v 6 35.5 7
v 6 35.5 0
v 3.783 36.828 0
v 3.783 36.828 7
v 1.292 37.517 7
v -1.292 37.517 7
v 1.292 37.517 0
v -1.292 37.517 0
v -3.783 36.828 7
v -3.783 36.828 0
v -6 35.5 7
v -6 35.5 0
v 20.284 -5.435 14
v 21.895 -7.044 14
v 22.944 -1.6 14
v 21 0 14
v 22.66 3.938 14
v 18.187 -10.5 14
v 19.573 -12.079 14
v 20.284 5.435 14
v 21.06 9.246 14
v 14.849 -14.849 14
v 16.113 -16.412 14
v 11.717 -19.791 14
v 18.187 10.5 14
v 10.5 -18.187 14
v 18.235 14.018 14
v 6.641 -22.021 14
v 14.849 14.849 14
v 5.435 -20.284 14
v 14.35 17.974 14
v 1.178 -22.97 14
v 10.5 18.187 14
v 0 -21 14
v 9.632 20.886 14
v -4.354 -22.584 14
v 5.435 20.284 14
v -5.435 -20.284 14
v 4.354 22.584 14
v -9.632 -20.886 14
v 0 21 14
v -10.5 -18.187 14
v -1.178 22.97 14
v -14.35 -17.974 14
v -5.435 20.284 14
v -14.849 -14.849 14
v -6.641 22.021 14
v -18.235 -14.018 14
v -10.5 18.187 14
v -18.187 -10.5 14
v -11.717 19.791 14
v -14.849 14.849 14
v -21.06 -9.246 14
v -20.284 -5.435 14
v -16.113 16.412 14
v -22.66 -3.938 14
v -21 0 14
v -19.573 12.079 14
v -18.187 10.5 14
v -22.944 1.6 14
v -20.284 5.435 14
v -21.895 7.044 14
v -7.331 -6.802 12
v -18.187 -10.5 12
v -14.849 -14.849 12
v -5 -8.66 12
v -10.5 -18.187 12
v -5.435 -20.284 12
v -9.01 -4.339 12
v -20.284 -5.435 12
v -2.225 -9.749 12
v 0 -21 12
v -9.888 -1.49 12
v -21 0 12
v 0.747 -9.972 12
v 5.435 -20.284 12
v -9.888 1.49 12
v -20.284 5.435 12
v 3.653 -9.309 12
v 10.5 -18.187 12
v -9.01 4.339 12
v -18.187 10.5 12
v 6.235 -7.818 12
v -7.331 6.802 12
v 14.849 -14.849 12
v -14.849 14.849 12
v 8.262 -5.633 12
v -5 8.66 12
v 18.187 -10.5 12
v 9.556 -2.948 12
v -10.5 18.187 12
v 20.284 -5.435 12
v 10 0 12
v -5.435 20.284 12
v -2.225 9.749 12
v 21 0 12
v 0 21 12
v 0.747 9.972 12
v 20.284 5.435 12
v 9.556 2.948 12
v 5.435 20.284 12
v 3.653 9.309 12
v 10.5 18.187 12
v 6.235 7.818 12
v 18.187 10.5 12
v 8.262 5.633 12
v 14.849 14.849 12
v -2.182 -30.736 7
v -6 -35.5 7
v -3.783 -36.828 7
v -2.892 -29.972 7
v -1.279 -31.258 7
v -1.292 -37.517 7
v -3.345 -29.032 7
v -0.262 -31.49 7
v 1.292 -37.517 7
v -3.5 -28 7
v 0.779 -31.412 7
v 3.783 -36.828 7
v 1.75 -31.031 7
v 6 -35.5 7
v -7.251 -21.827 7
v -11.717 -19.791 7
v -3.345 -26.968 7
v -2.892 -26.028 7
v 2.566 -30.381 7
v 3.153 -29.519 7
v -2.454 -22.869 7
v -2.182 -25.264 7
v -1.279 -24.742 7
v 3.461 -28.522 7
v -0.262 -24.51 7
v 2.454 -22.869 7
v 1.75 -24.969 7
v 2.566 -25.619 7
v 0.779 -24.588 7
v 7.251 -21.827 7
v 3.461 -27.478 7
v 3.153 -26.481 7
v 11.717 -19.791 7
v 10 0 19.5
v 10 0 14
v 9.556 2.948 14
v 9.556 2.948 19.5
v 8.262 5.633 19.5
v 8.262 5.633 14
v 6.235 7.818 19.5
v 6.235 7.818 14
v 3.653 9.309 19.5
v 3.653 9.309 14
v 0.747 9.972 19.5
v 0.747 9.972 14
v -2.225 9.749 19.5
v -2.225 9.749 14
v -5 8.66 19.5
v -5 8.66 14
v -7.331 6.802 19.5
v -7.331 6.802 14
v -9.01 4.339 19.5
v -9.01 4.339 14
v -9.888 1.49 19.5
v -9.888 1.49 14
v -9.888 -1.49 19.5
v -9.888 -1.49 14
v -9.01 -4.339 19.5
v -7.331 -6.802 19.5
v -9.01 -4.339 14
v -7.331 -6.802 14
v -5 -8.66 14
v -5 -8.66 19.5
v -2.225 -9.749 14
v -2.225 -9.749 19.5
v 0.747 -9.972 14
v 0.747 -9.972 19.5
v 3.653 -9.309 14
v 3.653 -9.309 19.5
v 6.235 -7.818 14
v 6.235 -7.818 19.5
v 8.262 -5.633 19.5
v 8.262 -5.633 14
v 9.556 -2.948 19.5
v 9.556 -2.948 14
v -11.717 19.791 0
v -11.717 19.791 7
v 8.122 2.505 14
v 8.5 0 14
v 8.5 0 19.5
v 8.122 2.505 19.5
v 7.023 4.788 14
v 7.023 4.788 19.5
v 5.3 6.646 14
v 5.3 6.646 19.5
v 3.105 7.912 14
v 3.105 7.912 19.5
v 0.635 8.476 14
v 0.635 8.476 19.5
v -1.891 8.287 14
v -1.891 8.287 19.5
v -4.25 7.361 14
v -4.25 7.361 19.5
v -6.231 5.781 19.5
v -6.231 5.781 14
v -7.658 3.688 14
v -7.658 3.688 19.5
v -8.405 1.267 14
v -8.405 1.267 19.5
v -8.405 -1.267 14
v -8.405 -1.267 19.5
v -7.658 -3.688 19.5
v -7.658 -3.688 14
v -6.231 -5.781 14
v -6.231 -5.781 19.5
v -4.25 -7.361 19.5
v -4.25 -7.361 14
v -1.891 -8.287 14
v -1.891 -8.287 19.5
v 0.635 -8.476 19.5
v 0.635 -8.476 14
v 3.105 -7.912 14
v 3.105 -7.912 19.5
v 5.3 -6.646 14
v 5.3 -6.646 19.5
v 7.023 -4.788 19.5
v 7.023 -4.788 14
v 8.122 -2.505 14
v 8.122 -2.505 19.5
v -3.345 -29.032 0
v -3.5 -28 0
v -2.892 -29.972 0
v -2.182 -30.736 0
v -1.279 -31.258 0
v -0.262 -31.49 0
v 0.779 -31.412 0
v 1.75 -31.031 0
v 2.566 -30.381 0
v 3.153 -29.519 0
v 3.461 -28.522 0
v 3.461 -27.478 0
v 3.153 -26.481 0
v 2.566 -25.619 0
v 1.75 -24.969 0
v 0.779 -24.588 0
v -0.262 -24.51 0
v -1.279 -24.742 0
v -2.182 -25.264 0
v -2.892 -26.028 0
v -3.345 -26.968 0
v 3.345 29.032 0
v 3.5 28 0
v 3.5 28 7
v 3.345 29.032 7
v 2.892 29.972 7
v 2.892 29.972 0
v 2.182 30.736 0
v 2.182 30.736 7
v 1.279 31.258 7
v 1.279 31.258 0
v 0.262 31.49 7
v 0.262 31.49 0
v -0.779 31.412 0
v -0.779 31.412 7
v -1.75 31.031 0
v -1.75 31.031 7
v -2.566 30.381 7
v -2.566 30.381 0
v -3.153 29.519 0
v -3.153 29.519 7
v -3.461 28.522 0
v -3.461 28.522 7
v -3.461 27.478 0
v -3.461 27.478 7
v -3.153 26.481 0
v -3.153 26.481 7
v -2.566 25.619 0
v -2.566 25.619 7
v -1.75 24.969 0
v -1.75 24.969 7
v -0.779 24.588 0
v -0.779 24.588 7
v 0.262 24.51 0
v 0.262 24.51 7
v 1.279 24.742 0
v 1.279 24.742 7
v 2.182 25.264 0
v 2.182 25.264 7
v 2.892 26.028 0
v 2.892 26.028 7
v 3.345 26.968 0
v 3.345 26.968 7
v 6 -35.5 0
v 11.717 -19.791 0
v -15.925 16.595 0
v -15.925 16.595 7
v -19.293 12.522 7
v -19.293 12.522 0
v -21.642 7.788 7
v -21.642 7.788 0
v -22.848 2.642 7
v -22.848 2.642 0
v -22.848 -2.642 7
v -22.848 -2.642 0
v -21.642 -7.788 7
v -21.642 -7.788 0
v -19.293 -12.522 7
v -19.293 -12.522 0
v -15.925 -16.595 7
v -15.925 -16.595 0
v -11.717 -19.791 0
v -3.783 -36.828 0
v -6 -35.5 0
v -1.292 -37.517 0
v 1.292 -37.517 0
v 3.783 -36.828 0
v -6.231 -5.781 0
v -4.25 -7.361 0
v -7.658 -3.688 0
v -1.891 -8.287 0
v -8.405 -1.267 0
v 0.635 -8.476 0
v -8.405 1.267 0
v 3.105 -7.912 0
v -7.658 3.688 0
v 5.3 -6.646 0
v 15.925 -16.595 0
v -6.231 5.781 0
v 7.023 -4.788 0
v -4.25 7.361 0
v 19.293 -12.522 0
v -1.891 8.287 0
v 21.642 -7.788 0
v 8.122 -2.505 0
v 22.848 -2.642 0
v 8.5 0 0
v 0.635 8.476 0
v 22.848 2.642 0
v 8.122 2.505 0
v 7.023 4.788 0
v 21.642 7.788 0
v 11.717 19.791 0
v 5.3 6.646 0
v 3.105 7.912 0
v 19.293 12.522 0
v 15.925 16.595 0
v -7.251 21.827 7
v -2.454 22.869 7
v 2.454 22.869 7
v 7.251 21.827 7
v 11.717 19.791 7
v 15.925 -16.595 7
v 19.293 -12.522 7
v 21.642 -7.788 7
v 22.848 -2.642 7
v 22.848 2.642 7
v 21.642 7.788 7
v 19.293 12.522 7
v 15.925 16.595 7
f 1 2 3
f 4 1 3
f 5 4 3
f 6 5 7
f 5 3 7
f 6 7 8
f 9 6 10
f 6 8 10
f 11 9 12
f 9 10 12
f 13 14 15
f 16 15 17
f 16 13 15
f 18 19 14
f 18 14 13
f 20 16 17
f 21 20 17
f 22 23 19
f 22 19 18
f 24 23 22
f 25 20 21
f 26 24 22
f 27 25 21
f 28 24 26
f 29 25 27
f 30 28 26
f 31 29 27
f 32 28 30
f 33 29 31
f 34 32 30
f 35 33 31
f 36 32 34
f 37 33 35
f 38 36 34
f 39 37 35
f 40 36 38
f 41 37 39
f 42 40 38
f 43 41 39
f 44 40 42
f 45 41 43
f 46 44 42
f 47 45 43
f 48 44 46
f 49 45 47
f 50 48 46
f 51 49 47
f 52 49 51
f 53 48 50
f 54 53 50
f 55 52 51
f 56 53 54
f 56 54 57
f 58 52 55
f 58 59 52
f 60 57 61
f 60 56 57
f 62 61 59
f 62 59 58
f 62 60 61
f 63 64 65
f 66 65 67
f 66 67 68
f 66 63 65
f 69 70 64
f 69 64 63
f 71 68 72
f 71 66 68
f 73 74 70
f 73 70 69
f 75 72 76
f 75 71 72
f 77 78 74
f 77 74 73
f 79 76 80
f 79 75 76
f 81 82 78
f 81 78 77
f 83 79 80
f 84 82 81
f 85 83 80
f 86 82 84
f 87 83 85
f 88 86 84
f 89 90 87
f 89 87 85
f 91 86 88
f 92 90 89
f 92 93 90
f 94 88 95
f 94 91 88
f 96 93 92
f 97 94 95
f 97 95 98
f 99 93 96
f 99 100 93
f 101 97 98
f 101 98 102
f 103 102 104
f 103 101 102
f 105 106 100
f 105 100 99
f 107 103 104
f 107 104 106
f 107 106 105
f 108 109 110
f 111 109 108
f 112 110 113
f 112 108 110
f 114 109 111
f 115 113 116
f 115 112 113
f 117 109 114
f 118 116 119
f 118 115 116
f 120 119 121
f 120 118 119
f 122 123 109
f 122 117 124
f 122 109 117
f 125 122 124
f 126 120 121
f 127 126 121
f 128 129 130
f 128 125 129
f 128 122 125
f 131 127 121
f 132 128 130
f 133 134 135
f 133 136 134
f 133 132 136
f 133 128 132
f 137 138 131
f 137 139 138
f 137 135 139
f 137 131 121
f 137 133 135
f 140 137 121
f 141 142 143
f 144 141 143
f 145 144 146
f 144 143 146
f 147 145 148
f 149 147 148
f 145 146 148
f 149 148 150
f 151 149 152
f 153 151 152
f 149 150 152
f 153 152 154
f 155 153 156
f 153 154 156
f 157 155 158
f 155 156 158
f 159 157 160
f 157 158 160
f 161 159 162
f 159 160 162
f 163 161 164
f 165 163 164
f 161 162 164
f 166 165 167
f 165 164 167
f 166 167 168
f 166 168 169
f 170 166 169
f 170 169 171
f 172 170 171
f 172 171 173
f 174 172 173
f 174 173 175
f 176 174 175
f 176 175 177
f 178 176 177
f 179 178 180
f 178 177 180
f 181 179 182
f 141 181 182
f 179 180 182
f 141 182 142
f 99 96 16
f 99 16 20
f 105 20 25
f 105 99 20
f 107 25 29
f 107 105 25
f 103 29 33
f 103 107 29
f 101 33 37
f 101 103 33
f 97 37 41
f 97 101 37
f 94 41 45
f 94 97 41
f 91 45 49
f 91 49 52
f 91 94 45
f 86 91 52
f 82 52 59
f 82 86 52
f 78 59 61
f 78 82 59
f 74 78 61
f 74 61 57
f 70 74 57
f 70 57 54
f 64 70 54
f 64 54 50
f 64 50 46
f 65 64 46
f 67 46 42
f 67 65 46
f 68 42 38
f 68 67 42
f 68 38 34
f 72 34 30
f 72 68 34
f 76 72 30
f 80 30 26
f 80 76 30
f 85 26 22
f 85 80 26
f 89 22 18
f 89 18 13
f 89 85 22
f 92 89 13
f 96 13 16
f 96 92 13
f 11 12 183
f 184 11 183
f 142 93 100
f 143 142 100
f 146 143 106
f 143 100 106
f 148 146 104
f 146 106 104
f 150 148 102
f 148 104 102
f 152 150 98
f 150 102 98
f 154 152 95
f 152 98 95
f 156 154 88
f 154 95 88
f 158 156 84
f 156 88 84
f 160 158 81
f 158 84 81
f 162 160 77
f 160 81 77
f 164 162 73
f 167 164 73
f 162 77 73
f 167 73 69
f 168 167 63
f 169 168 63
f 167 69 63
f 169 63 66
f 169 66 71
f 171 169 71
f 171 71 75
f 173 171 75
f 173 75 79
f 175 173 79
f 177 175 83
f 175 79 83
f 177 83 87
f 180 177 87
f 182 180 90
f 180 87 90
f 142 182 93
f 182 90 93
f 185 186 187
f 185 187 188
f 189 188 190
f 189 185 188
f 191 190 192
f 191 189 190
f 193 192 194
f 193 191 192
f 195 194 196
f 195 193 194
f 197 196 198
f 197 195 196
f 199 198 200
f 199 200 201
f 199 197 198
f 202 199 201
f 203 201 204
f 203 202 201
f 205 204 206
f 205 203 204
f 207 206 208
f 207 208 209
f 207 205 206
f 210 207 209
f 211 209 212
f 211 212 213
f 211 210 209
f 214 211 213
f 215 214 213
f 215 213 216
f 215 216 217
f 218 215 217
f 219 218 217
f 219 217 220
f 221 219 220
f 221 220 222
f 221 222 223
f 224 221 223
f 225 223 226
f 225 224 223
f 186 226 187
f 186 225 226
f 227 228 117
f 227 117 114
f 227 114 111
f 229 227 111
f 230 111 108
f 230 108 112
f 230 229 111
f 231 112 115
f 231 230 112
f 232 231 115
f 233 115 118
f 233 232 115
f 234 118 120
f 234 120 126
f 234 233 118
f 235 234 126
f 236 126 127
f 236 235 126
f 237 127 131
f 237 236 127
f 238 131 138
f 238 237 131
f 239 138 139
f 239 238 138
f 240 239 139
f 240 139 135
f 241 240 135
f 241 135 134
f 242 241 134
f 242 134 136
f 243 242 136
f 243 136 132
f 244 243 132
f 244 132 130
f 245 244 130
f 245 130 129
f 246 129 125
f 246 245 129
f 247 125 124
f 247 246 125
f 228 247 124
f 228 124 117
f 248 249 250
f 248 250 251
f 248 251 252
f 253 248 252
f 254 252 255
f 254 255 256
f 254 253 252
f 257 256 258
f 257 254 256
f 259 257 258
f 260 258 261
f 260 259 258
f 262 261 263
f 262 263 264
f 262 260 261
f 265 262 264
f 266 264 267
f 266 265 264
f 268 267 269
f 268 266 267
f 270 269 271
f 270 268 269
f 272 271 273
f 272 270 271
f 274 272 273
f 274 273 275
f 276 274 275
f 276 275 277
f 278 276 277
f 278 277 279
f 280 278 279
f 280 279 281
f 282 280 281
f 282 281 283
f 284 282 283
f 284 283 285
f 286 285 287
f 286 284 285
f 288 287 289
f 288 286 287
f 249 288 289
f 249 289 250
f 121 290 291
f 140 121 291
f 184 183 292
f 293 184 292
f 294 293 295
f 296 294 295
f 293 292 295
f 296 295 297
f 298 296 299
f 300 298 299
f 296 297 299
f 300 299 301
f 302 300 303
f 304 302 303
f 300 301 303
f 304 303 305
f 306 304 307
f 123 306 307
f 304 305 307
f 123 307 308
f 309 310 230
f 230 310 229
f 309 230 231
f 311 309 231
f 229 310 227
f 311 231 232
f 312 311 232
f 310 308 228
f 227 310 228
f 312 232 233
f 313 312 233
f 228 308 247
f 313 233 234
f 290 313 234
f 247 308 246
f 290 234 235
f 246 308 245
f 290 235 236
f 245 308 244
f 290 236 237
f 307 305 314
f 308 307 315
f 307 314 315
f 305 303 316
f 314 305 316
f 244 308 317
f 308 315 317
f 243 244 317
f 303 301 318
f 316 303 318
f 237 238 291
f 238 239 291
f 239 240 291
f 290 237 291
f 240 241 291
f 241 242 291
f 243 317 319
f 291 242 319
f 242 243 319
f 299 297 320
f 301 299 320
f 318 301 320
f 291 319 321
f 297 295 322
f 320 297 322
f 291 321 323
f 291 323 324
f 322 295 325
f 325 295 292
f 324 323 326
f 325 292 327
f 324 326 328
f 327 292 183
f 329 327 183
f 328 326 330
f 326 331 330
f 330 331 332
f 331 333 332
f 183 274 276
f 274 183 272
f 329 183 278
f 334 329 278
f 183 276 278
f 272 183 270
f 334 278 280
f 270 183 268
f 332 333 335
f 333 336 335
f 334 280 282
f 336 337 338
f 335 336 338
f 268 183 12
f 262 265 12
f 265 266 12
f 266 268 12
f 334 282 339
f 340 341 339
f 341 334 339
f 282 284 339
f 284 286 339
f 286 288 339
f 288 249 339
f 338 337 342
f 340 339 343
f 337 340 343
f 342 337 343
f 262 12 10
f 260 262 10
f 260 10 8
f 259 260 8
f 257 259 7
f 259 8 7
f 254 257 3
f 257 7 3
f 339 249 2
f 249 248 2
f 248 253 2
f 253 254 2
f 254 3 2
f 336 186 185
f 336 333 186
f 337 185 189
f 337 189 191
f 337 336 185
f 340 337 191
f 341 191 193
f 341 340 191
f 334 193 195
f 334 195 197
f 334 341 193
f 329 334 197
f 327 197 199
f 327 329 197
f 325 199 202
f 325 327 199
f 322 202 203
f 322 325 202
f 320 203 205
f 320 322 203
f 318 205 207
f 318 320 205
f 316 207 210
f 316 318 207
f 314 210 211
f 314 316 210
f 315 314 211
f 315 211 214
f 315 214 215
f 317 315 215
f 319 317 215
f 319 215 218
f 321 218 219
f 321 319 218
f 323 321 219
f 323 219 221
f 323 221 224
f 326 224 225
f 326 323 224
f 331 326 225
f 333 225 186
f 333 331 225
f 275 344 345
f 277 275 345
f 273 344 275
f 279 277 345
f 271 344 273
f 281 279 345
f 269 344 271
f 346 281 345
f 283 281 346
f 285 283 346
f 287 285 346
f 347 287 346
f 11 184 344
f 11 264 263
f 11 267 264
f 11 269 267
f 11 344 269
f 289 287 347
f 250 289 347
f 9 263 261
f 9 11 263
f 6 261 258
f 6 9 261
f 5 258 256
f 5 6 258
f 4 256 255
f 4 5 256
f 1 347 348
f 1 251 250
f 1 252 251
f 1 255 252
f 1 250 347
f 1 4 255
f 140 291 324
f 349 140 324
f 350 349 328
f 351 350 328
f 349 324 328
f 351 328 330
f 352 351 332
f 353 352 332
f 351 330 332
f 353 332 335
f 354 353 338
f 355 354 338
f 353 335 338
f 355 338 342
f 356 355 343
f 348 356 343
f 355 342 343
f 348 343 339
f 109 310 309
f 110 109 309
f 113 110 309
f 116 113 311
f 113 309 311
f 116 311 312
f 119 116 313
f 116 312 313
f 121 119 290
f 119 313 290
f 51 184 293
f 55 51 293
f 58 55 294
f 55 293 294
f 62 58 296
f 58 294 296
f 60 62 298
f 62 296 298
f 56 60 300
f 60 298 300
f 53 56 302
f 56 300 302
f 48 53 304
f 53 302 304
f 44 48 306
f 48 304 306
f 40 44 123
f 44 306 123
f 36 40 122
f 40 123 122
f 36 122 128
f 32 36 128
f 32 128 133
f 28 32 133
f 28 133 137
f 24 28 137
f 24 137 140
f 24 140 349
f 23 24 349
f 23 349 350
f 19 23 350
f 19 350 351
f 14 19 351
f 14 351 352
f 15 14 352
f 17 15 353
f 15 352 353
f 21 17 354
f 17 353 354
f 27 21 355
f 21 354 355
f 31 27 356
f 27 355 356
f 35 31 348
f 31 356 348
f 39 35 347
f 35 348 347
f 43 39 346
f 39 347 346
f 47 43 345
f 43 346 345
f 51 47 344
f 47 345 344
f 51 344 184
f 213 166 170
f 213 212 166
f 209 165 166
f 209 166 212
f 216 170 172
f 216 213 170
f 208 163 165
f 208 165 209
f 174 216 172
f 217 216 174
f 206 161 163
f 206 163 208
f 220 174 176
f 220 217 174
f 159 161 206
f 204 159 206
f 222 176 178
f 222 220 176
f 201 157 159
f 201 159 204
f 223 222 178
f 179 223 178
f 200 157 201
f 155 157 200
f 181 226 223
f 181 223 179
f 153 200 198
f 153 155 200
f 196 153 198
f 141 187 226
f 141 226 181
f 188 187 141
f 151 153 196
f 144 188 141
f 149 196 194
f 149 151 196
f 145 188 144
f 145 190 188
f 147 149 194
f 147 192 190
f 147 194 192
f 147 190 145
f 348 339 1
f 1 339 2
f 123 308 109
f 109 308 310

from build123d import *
from build123d.topology import SkipClean

# Parameters (mm, degrees)
ESQUISSE1_R             = 3.5
ESQUISSE1_R_2           = 8.5
BOSS_EXTRU_1_DEPTH      = 7
ESQUISSE2_R             = 23
ESQUISSE2_R_2           = 8.5
BOSS_EXTRU_2_DEPTH      = 7
ESQUISSE3_R             = 10
ESQUISSE3_R_2           = 8.5
BOSS_EXTRU_3_DEPTH      = 5.5
ENL_V_START             = -2
ESQUISSE4_R             = 21
ESQUISSE4_R_2           = 10
ENL_V_MAT_EXTRU_1_DEPTH = 2


with BuildPart() as part:
    # Esquisse1 → Boss.-Extru.1 (new body)
    with BuildSketch(Plane.XY):
        with BuildLine():
            Line((11.717444642, 19.791449948), (6, 35.5))
            ThreePointArc((6, 35.5), (0, 37.604686356), (-6, 35.5))
            Line((-6, 35.5), (-11.717444642, 19.791449948))
            ThreePointArc((-11.717444642, 19.791449948), (-23, 0), (-11.717444642, -19.791449948))
            Line((-11.717444642, -19.791449948), (-6, -35.5))
            ThreePointArc((-6, -35.5), (0, -37.604686356), (6, -35.5))
            Line((6, -35.5), (11.717444642, -19.791449948))
            ThreePointArc((11.717444642, -19.791449948), (23, 0), (11.717444642, 19.791449948))
        make_face()
        with Locations((0, 28)):
            Circle(ESQUISSE1_R, mode=Mode.SUBTRACT)
        Circle(ESQUISSE1_R_2, mode=Mode.SUBTRACT)
        with Locations(Location((0, -28, 0), (0, 0, 180))):
            Circle(ESQUISSE1_R, mode=Mode.SUBTRACT)
    extrude(amount=BOSS_EXTRU_1_DEPTH)

    # Esquisse2 → Boss.-Extru.2 (add)
    with BuildSketch(Plane.XY.offset(7)):
        with Locations(Location((0, 0, 0), (0, 0, 120.627475448))):
            Circle(ESQUISSE2_R)
        Circle(ESQUISSE2_R_2, mode=Mode.SUBTRACT)
    extrude(amount=BOSS_EXTRU_2_DEPTH)

    # Esquisse3 → Boss.-Extru.3 (add)
    with SkipClean():  # the faces are left unmerged after this step: merging them gives an invalid solid
        with BuildSketch(Plane.XY.offset(14)):
            Circle(ESQUISSE3_R)
            Circle(ESQUISSE3_R_2, mode=Mode.SUBTRACT)
        extrude(amount=BOSS_EXTRU_3_DEPTH)

    # Esquisse4 → Enlèv. mat.-Extru.1 (cut)
    with SkipClean():  # the faces are left unmerged after this step: merging them gives an invalid solid
        with BuildSketch(Plane.XY.offset(14).offset(ENL_V_START)):
            Circle(ESQUISSE4_R)
            Circle(ESQUISSE4_R_2, mode=Mode.SUBTRACT)
        extrude(amount=ENL_V_MAT_EXTRU_1_DEPTH, mode=Mode.SUBTRACT)


solid = part.part
